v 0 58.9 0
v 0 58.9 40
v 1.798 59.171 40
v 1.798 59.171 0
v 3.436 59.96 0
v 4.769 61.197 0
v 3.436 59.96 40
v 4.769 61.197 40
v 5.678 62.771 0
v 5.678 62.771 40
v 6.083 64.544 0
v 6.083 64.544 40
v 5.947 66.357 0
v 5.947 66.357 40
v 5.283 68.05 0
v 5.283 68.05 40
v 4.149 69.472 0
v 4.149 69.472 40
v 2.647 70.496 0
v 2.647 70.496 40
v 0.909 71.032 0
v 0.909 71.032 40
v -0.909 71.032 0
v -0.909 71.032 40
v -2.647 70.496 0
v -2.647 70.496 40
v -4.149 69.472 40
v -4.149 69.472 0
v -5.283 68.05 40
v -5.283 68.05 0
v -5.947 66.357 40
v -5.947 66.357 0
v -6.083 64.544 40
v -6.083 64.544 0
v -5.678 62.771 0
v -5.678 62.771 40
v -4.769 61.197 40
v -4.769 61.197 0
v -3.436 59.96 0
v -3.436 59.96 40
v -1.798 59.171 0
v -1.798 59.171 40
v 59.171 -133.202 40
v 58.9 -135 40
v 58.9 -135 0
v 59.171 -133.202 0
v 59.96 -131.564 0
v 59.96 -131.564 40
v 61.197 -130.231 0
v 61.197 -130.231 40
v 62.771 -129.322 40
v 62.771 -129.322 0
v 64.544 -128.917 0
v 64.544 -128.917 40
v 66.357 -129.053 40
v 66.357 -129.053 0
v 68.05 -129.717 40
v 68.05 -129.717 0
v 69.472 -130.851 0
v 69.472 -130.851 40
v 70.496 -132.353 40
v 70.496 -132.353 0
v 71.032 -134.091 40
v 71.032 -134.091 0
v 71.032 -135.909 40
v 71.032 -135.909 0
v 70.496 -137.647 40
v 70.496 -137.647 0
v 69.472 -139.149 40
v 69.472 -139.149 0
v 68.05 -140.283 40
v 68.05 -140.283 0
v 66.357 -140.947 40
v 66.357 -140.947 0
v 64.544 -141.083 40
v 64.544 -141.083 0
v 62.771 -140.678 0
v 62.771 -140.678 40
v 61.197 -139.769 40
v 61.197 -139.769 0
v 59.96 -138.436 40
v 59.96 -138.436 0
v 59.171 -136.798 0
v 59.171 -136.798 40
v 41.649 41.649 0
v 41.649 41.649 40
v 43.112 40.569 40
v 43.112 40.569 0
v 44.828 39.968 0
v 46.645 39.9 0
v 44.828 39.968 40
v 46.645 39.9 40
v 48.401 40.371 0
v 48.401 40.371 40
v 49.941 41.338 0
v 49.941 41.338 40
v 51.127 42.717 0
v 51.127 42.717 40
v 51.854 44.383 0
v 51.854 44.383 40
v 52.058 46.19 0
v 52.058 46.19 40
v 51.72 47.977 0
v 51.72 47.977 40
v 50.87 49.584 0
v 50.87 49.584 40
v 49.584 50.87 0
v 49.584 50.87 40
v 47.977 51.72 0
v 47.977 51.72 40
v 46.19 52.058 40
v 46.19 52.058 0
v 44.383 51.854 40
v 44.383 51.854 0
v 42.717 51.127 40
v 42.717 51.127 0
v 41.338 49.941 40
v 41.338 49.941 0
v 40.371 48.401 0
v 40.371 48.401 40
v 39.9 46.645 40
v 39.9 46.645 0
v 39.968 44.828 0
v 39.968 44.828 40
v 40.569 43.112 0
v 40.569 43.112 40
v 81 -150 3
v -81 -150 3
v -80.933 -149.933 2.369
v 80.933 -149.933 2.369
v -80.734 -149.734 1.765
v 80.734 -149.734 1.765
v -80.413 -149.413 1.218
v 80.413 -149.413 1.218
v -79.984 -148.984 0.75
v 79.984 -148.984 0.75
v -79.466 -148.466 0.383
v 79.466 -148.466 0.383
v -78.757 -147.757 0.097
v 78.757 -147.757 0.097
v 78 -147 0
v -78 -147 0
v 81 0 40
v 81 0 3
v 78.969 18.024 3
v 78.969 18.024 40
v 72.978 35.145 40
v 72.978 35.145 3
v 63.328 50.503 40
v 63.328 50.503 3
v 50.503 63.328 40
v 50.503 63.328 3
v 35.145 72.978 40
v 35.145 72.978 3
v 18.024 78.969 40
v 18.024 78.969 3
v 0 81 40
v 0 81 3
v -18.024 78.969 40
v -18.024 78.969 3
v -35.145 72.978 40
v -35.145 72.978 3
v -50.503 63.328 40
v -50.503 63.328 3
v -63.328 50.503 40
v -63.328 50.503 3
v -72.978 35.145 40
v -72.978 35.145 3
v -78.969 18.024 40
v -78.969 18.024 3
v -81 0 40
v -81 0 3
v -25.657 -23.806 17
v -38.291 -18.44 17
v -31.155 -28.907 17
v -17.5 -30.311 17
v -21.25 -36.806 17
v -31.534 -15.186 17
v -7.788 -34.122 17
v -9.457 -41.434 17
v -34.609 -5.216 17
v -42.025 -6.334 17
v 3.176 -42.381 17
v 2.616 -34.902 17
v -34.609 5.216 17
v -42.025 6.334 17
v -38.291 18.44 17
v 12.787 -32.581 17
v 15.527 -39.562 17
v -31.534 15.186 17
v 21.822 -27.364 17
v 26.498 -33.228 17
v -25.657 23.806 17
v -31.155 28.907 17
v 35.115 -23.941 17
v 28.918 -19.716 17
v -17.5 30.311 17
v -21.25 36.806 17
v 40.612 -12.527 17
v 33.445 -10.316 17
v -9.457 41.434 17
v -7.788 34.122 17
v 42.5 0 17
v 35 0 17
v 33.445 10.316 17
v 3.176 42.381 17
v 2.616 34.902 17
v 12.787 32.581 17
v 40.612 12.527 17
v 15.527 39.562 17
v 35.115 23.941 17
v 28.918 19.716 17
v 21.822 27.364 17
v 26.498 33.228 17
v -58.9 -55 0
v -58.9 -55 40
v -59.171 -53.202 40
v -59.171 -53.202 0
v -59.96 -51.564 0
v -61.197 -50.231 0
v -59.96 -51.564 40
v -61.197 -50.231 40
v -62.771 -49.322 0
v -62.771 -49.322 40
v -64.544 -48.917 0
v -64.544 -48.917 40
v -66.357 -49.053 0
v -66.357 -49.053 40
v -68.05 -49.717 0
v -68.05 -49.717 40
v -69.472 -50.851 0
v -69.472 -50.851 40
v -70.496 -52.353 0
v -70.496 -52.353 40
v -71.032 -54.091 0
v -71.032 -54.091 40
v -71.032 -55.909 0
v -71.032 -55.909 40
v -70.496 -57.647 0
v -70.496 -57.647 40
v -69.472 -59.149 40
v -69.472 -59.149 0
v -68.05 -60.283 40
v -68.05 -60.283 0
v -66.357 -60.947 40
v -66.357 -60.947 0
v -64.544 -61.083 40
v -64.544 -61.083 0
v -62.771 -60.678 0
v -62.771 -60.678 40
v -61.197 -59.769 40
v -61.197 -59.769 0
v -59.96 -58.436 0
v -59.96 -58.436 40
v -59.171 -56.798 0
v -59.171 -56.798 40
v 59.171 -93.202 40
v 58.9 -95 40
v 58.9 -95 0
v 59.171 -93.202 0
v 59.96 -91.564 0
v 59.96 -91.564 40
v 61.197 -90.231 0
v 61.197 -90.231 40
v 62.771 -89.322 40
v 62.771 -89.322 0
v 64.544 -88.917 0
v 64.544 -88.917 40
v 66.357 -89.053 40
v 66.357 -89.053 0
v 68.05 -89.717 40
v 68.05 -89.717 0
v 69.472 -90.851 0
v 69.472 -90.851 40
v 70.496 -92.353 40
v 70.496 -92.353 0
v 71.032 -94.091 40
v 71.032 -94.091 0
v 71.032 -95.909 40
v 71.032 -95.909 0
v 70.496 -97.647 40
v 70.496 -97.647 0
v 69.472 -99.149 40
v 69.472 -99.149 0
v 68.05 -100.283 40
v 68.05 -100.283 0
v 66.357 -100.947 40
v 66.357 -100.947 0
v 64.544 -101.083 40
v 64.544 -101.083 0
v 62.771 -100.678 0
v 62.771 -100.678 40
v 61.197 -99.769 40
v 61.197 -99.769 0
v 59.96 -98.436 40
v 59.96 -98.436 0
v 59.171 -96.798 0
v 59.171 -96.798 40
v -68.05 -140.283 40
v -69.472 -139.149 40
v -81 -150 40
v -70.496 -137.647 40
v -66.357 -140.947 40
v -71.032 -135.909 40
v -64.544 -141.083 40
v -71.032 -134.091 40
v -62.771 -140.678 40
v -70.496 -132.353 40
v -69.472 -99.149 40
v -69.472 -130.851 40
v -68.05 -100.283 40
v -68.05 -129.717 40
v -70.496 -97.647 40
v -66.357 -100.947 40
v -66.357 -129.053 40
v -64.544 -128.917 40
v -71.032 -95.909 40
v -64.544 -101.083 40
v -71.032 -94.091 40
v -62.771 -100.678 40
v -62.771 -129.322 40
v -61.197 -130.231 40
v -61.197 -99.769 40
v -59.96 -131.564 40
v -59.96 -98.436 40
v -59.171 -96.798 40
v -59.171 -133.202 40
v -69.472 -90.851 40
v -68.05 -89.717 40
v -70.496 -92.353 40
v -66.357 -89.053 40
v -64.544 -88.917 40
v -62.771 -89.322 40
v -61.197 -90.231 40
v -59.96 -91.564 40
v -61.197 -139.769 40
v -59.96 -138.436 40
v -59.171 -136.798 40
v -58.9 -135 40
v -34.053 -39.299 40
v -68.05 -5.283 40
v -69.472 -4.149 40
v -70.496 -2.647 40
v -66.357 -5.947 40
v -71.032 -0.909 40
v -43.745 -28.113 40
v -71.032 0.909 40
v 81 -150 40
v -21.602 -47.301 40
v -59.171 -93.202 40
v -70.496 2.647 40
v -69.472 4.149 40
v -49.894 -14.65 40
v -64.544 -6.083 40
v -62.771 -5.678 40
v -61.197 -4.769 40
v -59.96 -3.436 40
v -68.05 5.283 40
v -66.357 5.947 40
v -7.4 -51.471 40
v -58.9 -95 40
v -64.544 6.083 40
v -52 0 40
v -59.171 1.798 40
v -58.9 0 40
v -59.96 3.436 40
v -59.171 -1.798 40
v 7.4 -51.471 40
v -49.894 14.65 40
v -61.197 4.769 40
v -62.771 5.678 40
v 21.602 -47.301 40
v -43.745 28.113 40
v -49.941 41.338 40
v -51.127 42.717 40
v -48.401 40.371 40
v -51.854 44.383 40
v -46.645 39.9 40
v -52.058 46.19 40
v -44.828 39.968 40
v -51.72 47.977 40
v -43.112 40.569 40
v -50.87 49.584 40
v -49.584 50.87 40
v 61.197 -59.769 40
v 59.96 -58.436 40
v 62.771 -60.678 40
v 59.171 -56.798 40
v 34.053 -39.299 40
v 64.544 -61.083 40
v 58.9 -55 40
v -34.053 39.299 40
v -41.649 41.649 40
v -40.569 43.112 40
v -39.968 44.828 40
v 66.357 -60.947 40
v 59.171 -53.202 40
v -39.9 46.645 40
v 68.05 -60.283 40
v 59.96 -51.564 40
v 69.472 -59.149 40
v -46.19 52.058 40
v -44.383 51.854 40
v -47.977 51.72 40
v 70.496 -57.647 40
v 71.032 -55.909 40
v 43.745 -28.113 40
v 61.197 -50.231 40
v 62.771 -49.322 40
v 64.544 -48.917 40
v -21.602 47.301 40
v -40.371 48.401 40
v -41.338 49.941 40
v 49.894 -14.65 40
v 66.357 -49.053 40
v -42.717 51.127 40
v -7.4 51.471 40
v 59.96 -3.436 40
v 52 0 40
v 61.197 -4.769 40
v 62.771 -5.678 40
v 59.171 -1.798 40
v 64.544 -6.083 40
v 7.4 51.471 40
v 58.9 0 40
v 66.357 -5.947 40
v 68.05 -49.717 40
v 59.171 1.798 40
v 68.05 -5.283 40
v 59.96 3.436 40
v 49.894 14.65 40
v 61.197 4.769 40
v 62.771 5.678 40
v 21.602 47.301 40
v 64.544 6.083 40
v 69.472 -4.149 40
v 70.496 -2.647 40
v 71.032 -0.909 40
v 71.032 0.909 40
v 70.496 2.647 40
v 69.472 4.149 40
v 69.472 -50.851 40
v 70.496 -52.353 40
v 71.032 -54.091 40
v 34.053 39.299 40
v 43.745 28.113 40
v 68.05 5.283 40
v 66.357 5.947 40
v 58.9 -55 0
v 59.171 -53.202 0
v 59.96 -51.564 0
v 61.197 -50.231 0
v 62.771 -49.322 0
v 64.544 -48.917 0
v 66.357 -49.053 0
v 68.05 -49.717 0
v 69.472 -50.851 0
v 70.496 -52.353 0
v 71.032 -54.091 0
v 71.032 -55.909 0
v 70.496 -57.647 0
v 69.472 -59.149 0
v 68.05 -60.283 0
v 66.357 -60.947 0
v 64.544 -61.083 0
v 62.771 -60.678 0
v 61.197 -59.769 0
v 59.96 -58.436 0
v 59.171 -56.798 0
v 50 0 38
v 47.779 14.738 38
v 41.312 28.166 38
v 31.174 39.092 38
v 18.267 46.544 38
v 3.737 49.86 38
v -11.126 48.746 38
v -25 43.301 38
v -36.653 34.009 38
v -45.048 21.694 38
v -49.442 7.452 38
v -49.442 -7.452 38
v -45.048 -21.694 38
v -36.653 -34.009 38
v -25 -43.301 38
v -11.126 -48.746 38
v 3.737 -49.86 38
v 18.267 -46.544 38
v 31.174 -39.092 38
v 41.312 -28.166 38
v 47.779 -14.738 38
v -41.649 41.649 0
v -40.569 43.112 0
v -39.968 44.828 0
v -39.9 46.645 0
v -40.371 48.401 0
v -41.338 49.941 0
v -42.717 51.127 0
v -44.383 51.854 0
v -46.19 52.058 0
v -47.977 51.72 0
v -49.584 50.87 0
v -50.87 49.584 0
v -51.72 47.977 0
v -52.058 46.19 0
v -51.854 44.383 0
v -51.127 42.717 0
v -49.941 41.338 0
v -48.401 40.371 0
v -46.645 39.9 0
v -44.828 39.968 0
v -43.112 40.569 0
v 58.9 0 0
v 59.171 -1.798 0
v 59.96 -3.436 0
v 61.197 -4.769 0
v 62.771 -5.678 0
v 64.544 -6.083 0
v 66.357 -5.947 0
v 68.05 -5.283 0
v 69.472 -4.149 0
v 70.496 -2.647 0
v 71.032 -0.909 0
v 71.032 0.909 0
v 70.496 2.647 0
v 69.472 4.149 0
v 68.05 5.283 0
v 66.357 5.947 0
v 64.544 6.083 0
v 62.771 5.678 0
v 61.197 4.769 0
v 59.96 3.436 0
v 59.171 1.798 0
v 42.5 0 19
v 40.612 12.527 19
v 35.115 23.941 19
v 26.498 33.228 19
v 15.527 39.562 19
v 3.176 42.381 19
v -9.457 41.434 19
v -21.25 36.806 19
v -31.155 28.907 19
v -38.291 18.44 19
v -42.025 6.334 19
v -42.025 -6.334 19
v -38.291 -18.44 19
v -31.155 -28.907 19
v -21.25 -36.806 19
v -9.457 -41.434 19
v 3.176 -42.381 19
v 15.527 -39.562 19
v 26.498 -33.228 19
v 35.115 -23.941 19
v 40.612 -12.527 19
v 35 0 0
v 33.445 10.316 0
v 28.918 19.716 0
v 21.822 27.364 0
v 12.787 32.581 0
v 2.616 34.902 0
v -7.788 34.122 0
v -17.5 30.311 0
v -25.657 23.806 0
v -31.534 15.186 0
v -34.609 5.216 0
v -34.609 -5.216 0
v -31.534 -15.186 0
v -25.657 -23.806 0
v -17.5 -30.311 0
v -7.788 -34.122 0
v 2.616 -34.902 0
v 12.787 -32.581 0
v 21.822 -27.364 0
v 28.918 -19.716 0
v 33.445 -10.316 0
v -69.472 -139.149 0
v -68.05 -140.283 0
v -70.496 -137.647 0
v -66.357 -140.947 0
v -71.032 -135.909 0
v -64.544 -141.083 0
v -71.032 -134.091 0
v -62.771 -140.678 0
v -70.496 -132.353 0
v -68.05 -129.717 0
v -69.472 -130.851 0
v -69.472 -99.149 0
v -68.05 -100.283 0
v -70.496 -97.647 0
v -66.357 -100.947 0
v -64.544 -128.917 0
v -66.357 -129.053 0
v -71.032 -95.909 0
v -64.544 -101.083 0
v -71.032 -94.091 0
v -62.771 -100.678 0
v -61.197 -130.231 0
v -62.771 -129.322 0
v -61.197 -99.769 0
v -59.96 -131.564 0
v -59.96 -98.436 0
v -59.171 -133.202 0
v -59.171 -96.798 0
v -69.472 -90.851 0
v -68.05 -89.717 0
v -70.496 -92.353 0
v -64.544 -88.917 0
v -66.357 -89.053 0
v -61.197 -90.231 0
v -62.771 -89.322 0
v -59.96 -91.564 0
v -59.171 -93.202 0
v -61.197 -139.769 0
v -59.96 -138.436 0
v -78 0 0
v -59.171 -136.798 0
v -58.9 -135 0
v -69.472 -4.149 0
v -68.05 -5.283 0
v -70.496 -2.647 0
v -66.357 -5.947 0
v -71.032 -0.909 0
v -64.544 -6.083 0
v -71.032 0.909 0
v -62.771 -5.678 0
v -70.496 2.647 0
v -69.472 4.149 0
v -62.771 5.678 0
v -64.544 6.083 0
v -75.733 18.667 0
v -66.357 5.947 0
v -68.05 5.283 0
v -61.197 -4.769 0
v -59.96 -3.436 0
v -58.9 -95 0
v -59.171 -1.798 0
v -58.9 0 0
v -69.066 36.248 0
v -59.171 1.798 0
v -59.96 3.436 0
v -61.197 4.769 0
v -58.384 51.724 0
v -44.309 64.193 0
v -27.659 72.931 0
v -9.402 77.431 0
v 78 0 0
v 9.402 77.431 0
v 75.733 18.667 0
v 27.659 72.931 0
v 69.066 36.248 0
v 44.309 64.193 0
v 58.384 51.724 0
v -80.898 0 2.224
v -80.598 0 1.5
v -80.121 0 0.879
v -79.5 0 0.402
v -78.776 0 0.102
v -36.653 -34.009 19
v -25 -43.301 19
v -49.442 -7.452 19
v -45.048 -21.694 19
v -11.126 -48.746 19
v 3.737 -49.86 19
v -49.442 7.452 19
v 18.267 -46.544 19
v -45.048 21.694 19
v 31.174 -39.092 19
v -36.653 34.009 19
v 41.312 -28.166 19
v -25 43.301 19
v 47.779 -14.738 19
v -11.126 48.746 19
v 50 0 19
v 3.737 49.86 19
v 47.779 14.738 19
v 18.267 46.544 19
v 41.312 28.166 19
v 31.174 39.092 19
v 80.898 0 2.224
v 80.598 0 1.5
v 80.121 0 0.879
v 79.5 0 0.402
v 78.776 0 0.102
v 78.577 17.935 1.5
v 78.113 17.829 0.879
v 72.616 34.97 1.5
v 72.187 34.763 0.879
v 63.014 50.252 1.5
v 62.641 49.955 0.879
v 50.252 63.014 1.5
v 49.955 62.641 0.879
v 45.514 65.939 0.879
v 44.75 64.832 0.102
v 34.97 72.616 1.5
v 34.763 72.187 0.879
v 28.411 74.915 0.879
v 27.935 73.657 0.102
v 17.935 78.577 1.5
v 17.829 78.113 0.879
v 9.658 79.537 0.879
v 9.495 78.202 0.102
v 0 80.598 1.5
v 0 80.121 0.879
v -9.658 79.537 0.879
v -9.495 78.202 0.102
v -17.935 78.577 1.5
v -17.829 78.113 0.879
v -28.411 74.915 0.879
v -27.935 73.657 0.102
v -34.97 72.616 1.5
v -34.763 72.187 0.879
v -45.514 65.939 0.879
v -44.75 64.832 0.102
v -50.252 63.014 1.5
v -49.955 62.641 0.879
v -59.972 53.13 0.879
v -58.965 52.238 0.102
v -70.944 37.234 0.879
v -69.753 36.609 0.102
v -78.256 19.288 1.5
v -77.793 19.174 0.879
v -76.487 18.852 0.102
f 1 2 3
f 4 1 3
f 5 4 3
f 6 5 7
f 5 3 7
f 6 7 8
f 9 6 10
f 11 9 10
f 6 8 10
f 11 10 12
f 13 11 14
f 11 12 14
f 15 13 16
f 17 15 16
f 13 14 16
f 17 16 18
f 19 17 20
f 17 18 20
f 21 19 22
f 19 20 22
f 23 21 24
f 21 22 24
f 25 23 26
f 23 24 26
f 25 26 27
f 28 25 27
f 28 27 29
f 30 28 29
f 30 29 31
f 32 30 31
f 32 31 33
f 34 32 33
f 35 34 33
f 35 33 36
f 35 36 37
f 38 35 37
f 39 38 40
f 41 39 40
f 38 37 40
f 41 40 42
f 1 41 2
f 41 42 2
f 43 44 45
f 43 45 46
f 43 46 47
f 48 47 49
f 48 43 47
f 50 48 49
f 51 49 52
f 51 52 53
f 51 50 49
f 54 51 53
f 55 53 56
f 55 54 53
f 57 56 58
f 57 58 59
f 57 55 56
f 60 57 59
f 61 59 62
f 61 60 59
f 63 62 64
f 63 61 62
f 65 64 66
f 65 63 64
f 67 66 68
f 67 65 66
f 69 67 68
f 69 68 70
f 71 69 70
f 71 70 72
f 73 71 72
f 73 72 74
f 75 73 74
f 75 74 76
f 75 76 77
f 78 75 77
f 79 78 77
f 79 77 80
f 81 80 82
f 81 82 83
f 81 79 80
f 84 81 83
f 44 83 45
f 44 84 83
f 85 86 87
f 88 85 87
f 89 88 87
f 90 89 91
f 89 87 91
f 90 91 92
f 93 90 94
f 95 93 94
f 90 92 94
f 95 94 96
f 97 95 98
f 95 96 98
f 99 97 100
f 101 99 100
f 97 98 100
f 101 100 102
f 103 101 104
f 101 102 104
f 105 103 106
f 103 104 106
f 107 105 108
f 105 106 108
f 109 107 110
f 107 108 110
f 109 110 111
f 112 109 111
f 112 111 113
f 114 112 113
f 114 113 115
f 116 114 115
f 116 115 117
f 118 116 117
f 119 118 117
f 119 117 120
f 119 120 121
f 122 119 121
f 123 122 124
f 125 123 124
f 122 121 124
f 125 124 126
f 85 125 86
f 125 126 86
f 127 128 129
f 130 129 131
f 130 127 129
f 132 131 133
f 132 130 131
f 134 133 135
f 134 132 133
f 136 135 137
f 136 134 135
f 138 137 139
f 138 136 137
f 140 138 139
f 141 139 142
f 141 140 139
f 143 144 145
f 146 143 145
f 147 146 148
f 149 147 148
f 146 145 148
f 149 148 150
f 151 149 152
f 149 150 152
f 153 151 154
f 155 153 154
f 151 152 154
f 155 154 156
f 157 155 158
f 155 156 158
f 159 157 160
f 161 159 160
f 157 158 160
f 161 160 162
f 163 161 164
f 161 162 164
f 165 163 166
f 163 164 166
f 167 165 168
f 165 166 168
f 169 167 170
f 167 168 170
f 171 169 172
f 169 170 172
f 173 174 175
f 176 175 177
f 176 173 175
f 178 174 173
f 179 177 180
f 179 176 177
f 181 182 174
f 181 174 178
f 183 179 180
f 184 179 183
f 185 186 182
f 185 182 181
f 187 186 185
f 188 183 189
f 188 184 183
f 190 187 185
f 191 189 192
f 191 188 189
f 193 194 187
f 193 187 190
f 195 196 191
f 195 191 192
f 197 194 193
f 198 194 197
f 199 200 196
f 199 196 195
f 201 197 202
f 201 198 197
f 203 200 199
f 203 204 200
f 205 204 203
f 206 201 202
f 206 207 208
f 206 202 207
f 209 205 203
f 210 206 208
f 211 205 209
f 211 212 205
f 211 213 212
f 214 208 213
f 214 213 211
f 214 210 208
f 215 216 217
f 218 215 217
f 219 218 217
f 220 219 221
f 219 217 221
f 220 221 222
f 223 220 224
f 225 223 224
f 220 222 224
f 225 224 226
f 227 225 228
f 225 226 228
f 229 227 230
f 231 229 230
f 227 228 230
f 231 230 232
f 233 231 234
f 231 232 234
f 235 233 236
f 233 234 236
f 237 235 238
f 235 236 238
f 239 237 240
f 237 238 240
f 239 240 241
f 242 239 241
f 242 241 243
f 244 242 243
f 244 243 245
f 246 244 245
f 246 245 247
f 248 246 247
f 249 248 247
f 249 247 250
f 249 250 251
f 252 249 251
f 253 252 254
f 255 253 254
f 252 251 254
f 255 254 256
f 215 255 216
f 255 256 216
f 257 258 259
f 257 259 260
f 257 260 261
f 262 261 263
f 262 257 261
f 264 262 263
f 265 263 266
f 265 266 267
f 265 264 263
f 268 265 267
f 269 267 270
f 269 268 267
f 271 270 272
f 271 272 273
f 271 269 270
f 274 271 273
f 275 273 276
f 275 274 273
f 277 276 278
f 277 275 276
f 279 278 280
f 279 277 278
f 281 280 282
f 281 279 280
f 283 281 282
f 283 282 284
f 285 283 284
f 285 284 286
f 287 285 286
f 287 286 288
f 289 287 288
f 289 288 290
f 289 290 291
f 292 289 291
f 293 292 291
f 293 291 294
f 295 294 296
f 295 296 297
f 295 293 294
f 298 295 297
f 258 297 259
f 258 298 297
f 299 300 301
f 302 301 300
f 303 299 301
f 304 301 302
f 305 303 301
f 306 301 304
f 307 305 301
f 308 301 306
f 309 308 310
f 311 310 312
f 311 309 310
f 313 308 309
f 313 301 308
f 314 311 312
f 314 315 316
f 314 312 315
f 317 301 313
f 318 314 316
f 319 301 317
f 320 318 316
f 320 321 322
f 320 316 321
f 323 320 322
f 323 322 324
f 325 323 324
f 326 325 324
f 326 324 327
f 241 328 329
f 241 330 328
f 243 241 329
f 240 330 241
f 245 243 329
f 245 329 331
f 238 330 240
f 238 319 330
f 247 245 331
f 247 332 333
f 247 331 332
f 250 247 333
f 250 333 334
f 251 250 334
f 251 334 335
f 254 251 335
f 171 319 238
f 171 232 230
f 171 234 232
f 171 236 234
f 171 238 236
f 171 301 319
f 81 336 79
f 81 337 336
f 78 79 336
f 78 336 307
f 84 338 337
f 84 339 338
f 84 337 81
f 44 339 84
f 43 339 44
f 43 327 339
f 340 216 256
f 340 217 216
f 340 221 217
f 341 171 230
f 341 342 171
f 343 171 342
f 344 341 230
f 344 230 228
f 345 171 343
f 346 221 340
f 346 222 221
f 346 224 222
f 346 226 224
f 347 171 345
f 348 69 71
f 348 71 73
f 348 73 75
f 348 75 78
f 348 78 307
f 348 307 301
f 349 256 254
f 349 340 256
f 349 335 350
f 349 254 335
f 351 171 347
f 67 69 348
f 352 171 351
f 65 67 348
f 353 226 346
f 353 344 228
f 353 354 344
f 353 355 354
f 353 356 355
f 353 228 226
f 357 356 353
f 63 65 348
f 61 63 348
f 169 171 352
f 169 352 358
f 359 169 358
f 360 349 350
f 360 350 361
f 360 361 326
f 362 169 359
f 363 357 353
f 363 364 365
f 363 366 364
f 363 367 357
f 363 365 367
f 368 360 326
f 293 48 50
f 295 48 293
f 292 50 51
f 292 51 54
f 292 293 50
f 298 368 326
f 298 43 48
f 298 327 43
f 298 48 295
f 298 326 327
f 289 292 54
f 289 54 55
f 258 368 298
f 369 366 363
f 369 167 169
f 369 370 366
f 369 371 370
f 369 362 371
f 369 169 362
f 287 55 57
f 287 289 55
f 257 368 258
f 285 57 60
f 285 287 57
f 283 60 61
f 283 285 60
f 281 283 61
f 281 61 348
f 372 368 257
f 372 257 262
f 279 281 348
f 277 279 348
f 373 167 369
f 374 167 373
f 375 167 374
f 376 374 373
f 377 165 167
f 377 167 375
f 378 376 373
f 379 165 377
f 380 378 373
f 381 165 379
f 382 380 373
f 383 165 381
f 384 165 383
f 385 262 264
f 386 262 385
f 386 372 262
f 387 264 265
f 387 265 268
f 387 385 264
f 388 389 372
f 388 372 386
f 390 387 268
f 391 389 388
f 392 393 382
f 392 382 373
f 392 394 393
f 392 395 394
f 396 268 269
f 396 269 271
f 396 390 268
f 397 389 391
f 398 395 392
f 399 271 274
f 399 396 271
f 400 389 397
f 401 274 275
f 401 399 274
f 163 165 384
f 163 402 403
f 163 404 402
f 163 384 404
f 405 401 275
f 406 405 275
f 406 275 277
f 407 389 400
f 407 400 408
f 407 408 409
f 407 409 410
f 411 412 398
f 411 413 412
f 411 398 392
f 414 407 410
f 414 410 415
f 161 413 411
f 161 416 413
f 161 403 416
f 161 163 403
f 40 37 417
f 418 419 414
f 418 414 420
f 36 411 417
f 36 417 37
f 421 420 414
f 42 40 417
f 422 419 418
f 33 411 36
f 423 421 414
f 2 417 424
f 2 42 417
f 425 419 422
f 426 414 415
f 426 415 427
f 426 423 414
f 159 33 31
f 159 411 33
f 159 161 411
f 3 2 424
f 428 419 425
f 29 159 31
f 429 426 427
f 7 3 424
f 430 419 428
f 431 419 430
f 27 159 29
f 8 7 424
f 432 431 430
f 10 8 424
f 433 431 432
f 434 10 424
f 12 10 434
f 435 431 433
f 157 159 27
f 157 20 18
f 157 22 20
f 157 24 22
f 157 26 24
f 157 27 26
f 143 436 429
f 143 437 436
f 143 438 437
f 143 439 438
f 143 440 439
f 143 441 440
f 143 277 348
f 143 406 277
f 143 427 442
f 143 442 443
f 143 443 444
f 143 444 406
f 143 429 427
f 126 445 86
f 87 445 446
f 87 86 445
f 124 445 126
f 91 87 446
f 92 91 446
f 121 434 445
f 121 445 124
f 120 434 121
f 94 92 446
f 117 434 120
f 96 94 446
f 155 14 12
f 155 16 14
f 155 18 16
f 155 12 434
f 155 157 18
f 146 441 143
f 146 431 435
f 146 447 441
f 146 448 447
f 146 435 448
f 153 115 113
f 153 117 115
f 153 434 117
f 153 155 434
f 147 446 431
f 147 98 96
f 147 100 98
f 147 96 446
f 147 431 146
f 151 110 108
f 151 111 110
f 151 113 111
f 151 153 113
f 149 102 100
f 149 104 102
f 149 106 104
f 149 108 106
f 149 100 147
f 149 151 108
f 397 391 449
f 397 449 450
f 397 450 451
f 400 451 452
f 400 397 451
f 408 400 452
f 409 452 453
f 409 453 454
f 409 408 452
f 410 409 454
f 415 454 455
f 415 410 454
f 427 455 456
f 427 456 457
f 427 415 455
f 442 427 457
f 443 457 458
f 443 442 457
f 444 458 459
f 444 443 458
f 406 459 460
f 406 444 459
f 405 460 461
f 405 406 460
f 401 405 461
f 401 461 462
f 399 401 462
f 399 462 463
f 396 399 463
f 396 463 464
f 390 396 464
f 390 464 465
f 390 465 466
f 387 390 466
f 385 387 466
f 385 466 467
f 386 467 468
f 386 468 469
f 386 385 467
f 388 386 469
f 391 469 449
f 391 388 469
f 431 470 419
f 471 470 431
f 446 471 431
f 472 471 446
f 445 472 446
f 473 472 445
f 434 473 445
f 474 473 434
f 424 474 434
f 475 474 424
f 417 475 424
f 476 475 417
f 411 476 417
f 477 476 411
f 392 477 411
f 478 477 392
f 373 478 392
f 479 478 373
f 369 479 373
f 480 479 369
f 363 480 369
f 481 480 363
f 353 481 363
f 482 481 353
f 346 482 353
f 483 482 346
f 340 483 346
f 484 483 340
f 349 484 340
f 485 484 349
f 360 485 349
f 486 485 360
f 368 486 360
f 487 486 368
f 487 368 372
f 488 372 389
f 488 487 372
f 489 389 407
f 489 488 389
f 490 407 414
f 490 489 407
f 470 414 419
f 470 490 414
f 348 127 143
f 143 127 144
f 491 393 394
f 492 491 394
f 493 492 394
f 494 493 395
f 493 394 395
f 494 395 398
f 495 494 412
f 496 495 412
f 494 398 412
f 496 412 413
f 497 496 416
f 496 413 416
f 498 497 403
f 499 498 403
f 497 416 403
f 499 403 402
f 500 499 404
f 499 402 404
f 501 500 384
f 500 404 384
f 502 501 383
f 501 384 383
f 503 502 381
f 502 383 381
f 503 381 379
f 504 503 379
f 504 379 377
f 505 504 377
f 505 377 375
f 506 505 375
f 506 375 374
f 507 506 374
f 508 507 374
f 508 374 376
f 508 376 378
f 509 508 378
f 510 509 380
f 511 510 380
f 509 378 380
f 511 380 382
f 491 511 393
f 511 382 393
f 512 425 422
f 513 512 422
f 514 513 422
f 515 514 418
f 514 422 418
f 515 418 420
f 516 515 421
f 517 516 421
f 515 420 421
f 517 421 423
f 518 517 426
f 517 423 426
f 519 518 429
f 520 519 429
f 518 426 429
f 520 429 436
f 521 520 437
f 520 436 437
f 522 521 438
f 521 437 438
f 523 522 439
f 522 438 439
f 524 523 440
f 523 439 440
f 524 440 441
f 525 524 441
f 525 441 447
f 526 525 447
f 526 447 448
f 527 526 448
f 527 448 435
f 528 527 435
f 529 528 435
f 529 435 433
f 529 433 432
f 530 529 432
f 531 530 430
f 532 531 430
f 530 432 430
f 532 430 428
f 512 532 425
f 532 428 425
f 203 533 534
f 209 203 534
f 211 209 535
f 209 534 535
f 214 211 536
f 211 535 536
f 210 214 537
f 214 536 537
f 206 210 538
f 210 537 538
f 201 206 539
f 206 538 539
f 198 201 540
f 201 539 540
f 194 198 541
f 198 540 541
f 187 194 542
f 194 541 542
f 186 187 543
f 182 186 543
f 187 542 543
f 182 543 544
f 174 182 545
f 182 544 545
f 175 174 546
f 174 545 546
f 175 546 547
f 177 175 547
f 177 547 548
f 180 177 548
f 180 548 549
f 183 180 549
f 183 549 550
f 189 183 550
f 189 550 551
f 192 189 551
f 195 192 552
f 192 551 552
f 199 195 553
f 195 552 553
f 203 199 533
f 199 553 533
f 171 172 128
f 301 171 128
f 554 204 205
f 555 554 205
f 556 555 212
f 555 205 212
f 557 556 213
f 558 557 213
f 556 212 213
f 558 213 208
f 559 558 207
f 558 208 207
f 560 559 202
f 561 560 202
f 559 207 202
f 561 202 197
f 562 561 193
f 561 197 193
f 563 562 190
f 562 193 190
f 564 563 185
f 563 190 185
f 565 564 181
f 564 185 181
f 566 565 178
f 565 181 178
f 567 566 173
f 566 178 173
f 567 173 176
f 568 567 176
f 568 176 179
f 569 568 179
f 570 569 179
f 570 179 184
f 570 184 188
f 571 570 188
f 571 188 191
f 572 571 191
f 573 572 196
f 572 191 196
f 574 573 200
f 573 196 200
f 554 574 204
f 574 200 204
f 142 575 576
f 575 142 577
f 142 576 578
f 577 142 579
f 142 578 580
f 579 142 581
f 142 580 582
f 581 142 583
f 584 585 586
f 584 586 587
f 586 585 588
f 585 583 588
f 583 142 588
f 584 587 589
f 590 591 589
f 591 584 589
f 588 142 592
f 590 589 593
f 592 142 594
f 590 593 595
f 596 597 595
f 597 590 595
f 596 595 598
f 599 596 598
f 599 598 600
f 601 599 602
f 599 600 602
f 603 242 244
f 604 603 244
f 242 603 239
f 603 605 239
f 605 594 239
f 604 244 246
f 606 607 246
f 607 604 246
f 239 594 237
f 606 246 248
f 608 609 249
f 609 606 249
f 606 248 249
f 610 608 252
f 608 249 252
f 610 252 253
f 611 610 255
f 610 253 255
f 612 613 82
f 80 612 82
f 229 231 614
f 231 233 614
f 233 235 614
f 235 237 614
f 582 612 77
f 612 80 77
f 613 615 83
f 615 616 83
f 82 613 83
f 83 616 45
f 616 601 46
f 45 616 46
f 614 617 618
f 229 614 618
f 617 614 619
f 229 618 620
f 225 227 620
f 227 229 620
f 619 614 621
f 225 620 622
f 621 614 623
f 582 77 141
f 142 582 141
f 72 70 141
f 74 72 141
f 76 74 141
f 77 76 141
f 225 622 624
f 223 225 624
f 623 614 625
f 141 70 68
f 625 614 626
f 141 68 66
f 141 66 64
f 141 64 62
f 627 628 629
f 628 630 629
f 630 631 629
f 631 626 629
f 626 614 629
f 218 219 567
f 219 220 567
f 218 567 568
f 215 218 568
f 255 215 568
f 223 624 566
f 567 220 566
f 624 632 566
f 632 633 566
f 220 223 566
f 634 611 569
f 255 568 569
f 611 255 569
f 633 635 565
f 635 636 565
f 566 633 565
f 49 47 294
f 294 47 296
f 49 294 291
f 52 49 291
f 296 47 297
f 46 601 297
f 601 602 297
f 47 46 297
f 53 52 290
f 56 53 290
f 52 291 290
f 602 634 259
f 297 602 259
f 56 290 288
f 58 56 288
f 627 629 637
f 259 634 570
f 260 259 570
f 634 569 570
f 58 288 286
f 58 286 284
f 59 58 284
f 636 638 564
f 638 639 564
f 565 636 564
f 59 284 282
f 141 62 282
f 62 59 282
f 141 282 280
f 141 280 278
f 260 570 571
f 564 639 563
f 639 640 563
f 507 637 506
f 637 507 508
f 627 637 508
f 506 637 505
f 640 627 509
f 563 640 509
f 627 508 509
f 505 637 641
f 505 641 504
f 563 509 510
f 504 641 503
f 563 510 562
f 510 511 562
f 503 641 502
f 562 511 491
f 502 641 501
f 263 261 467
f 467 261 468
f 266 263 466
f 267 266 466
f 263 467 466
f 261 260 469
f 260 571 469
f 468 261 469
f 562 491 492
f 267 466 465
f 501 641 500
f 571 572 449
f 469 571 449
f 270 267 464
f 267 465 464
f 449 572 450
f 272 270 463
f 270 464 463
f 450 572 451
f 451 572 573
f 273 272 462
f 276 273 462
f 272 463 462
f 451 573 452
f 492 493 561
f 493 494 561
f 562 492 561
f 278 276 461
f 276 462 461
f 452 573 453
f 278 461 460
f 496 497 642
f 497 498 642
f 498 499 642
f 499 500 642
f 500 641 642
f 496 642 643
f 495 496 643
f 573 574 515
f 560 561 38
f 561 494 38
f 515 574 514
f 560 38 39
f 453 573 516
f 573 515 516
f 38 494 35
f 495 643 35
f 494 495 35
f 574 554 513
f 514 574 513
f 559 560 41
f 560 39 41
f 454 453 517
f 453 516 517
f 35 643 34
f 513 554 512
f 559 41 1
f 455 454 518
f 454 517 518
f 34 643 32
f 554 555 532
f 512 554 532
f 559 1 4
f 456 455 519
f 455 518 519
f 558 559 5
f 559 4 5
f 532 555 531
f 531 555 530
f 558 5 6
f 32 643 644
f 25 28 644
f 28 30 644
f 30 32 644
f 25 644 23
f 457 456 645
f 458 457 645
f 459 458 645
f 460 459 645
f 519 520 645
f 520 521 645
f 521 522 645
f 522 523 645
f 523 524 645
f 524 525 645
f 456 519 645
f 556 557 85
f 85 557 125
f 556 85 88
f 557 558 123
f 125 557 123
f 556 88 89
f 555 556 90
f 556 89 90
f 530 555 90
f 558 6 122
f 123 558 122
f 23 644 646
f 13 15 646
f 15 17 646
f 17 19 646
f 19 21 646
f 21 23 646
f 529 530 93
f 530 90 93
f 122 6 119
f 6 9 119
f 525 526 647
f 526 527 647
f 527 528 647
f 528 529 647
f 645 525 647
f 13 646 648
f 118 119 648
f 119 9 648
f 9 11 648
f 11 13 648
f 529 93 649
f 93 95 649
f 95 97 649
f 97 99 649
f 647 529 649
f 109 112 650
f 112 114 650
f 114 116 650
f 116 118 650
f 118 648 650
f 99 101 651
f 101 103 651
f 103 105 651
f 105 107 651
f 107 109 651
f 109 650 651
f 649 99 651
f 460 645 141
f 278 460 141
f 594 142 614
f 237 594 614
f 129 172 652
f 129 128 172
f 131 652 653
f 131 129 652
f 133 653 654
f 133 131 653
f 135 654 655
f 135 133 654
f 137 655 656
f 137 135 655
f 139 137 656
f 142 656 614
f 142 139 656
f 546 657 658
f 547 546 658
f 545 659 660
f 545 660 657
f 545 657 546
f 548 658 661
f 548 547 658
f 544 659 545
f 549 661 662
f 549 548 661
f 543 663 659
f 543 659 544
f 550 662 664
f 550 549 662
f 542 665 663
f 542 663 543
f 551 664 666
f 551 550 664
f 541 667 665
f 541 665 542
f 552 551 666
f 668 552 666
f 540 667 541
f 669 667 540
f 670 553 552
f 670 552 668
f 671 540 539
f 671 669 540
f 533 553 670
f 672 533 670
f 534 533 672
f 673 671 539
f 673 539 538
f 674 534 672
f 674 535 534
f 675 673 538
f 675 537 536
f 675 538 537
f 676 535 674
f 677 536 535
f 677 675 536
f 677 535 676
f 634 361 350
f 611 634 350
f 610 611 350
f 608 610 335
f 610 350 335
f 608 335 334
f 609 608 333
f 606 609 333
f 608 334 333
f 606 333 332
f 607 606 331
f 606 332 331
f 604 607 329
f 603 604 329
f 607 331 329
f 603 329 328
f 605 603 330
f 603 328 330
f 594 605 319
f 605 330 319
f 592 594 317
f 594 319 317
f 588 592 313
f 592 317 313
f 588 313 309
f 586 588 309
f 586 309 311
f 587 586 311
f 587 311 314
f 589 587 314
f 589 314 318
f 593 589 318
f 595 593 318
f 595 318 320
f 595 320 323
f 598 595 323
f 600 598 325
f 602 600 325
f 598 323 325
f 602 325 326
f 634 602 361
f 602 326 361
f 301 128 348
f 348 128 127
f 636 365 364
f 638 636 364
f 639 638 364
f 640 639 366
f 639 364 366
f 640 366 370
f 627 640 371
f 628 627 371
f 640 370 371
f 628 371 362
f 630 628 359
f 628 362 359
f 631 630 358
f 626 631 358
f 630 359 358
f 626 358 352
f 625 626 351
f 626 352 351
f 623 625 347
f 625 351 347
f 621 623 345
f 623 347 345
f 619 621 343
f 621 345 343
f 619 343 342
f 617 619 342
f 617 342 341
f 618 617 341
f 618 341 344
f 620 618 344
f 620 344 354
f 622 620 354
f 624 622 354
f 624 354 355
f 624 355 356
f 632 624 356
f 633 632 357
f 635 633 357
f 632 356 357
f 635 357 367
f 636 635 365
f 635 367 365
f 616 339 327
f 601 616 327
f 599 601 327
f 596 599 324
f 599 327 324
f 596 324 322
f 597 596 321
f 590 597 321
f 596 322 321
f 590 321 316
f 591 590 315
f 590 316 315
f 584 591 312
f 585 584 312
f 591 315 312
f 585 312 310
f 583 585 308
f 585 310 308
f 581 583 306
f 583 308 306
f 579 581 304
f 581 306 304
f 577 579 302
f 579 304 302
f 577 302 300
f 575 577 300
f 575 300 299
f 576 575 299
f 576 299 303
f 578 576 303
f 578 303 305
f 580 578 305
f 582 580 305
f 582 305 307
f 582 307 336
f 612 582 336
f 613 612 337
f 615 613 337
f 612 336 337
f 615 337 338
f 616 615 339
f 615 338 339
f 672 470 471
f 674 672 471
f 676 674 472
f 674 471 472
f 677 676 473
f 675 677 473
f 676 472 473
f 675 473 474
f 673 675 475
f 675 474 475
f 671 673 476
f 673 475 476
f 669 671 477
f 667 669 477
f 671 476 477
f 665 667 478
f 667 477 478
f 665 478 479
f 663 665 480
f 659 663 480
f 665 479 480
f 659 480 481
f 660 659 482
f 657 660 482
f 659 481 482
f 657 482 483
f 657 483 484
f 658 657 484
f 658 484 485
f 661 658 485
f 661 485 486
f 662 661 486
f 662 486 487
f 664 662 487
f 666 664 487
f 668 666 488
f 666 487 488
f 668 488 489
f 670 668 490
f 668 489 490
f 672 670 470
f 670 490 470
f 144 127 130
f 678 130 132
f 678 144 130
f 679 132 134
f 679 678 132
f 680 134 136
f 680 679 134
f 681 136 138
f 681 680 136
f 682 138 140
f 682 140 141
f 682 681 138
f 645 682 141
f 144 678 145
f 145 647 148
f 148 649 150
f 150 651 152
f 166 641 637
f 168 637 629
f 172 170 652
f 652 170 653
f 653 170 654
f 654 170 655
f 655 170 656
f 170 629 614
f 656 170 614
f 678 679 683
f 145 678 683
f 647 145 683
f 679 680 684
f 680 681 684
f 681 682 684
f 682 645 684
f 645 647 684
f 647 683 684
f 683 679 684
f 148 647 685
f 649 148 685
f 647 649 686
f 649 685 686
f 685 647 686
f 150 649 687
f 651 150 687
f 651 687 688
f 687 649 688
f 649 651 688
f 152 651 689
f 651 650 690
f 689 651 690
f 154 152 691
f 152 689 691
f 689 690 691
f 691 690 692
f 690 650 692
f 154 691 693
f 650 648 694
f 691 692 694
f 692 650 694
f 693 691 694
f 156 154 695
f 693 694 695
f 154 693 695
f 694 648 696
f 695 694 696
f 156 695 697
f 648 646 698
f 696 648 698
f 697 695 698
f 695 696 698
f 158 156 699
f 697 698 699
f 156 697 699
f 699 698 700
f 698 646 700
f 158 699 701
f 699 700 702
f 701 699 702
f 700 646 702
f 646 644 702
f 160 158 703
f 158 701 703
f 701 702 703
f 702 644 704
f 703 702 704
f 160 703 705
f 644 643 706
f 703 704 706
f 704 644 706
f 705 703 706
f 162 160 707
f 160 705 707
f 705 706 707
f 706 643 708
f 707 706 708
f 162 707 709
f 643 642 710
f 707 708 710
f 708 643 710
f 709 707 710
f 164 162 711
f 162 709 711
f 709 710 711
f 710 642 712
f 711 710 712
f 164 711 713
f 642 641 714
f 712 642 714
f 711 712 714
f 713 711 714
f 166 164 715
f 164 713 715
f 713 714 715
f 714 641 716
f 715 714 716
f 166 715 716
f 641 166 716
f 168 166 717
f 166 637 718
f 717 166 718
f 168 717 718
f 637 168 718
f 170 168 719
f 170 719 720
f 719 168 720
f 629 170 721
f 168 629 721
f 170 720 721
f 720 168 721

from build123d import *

# Parameters (mm, degrees)
BOSS_EXTRUDE1_DEPTH = 40
SKETCH2_R           = 6.1
CUT_EXTRUDE1_DEPTH  = 40
CIRPATTERN1_COUNT   = 5
CIRPATTERN1_ANGLE   = 180
SKETCH3_R           = 6.1
CUT_EXTRUDE2_DEPTH  = 40
SKETCH4_R           = 50
CUT_EXTRUDE3_DEPTH  = 21
SKETCH5_R           = 42.5
CUT_EXTRUDE4_DEPTH  = 2
SKETCH6_R           = 35
CUT_EXTRUDE5_DEPTH  = 17
CHAMFER1_SIZE       = 2
FILLET1_R           = 3


with BuildPart() as part:
    # Sketch1 → Boss-Extrude1 (new body)
    with BuildSketch(Plane.XY):
        with BuildLine():
            Line((-81, 0), (-81, -150))
            Line((-81, -150), (81, -150))
            Line((81, -150), (81, 0))
            ThreePointArc((81, 0), (0, 81), (-81, 0))
        make_face()
    extrude(amount=BOSS_EXTRUDE1_DEPTH)

    # Sketch2 → Cut-Extrude1 (cut)
    with BuildSketch(Plane.XY.offset(40)):
        with Locations((-65, 0)):
            Circle(SKETCH2_R)
    cut_extrude1 = extrude(amount=-CUT_EXTRUDE1_DEPTH, mode=Mode.SUBTRACT)

    # CirPattern1: Cut-Extrude1 ×5 about axis
    cirpattern1_axis = Axis((0, 0, 0), (0, 0, -1))
    for i in range(1, CIRPATTERN1_COUNT):
        add(cut_extrude1.rotate(cirpattern1_axis, i * CIRPATTERN1_ANGLE / (CIRPATTERN1_COUNT - 1)), mode=Mode.SUBTRACT)

    # Sketch3 → Cut-Extrude2 (cut)
    with BuildSketch(Plane.XY.offset(40)):
        with Locations((-65, -135)):
            Circle(SKETCH3_R)
        with Locations((-65, -95)):
            Circle(SKETCH3_R)
        with Locations((-65, -55)):
            Circle(SKETCH3_R)
    cut_extrude2 = extrude(amount=-CUT_EXTRUDE2_DEPTH, mode=Mode.SUBTRACT)

    # Mirror1: Cut-Extrude2 across plane
    add(cut_extrude2.mirror(Plane(origin=(0, 0, 0), x_dir=(0, 0, 1), z_dir=(1, 0, 0))), mode=Mode.SUBTRACT)

    # Sketch4 → Cut-Extrude3 (cut)
    with BuildSketch(Plane.XY.offset(40)):
        Circle(SKETCH4_R)
    extrude(amount=-CUT_EXTRUDE3_DEPTH, mode=Mode.SUBTRACT)

    # Sketch5 → Cut-Extrude4 (cut)
    with BuildSketch(Plane.XY.offset(19)):
        Circle(SKETCH5_R)
    extrude(amount=-CUT_EXTRUDE4_DEPTH, mode=Mode.SUBTRACT)

    # Sketch6 → Cut-Extrude5 (cut)
    with BuildSketch(Plane.XY.offset(17)):
        Circle(SKETCH6_R)
    extrude(amount=-CUT_EXTRUDE5_DEPTH, mode=Mode.SUBTRACT)

    # Chamfer1
    chamfer1_edges = [part.edges().sort_by_distance(p)[0] for p in [
        (-50, 0, 40),
    ]]
    chamfer(chamfer1_edges, length=CHAMFER1_SIZE)

    # Fillet1
    fillet1_edges = [part.edges().sort_by_distance(p)[0] for p in [
        (81, -75, 0),
        (0, -150, 0),
        (-81, -75, 0),
        (0, 81, 0),
    ]]
    fillet(fillet1_edges, radius=FILLET1_R)


solid = part.part
